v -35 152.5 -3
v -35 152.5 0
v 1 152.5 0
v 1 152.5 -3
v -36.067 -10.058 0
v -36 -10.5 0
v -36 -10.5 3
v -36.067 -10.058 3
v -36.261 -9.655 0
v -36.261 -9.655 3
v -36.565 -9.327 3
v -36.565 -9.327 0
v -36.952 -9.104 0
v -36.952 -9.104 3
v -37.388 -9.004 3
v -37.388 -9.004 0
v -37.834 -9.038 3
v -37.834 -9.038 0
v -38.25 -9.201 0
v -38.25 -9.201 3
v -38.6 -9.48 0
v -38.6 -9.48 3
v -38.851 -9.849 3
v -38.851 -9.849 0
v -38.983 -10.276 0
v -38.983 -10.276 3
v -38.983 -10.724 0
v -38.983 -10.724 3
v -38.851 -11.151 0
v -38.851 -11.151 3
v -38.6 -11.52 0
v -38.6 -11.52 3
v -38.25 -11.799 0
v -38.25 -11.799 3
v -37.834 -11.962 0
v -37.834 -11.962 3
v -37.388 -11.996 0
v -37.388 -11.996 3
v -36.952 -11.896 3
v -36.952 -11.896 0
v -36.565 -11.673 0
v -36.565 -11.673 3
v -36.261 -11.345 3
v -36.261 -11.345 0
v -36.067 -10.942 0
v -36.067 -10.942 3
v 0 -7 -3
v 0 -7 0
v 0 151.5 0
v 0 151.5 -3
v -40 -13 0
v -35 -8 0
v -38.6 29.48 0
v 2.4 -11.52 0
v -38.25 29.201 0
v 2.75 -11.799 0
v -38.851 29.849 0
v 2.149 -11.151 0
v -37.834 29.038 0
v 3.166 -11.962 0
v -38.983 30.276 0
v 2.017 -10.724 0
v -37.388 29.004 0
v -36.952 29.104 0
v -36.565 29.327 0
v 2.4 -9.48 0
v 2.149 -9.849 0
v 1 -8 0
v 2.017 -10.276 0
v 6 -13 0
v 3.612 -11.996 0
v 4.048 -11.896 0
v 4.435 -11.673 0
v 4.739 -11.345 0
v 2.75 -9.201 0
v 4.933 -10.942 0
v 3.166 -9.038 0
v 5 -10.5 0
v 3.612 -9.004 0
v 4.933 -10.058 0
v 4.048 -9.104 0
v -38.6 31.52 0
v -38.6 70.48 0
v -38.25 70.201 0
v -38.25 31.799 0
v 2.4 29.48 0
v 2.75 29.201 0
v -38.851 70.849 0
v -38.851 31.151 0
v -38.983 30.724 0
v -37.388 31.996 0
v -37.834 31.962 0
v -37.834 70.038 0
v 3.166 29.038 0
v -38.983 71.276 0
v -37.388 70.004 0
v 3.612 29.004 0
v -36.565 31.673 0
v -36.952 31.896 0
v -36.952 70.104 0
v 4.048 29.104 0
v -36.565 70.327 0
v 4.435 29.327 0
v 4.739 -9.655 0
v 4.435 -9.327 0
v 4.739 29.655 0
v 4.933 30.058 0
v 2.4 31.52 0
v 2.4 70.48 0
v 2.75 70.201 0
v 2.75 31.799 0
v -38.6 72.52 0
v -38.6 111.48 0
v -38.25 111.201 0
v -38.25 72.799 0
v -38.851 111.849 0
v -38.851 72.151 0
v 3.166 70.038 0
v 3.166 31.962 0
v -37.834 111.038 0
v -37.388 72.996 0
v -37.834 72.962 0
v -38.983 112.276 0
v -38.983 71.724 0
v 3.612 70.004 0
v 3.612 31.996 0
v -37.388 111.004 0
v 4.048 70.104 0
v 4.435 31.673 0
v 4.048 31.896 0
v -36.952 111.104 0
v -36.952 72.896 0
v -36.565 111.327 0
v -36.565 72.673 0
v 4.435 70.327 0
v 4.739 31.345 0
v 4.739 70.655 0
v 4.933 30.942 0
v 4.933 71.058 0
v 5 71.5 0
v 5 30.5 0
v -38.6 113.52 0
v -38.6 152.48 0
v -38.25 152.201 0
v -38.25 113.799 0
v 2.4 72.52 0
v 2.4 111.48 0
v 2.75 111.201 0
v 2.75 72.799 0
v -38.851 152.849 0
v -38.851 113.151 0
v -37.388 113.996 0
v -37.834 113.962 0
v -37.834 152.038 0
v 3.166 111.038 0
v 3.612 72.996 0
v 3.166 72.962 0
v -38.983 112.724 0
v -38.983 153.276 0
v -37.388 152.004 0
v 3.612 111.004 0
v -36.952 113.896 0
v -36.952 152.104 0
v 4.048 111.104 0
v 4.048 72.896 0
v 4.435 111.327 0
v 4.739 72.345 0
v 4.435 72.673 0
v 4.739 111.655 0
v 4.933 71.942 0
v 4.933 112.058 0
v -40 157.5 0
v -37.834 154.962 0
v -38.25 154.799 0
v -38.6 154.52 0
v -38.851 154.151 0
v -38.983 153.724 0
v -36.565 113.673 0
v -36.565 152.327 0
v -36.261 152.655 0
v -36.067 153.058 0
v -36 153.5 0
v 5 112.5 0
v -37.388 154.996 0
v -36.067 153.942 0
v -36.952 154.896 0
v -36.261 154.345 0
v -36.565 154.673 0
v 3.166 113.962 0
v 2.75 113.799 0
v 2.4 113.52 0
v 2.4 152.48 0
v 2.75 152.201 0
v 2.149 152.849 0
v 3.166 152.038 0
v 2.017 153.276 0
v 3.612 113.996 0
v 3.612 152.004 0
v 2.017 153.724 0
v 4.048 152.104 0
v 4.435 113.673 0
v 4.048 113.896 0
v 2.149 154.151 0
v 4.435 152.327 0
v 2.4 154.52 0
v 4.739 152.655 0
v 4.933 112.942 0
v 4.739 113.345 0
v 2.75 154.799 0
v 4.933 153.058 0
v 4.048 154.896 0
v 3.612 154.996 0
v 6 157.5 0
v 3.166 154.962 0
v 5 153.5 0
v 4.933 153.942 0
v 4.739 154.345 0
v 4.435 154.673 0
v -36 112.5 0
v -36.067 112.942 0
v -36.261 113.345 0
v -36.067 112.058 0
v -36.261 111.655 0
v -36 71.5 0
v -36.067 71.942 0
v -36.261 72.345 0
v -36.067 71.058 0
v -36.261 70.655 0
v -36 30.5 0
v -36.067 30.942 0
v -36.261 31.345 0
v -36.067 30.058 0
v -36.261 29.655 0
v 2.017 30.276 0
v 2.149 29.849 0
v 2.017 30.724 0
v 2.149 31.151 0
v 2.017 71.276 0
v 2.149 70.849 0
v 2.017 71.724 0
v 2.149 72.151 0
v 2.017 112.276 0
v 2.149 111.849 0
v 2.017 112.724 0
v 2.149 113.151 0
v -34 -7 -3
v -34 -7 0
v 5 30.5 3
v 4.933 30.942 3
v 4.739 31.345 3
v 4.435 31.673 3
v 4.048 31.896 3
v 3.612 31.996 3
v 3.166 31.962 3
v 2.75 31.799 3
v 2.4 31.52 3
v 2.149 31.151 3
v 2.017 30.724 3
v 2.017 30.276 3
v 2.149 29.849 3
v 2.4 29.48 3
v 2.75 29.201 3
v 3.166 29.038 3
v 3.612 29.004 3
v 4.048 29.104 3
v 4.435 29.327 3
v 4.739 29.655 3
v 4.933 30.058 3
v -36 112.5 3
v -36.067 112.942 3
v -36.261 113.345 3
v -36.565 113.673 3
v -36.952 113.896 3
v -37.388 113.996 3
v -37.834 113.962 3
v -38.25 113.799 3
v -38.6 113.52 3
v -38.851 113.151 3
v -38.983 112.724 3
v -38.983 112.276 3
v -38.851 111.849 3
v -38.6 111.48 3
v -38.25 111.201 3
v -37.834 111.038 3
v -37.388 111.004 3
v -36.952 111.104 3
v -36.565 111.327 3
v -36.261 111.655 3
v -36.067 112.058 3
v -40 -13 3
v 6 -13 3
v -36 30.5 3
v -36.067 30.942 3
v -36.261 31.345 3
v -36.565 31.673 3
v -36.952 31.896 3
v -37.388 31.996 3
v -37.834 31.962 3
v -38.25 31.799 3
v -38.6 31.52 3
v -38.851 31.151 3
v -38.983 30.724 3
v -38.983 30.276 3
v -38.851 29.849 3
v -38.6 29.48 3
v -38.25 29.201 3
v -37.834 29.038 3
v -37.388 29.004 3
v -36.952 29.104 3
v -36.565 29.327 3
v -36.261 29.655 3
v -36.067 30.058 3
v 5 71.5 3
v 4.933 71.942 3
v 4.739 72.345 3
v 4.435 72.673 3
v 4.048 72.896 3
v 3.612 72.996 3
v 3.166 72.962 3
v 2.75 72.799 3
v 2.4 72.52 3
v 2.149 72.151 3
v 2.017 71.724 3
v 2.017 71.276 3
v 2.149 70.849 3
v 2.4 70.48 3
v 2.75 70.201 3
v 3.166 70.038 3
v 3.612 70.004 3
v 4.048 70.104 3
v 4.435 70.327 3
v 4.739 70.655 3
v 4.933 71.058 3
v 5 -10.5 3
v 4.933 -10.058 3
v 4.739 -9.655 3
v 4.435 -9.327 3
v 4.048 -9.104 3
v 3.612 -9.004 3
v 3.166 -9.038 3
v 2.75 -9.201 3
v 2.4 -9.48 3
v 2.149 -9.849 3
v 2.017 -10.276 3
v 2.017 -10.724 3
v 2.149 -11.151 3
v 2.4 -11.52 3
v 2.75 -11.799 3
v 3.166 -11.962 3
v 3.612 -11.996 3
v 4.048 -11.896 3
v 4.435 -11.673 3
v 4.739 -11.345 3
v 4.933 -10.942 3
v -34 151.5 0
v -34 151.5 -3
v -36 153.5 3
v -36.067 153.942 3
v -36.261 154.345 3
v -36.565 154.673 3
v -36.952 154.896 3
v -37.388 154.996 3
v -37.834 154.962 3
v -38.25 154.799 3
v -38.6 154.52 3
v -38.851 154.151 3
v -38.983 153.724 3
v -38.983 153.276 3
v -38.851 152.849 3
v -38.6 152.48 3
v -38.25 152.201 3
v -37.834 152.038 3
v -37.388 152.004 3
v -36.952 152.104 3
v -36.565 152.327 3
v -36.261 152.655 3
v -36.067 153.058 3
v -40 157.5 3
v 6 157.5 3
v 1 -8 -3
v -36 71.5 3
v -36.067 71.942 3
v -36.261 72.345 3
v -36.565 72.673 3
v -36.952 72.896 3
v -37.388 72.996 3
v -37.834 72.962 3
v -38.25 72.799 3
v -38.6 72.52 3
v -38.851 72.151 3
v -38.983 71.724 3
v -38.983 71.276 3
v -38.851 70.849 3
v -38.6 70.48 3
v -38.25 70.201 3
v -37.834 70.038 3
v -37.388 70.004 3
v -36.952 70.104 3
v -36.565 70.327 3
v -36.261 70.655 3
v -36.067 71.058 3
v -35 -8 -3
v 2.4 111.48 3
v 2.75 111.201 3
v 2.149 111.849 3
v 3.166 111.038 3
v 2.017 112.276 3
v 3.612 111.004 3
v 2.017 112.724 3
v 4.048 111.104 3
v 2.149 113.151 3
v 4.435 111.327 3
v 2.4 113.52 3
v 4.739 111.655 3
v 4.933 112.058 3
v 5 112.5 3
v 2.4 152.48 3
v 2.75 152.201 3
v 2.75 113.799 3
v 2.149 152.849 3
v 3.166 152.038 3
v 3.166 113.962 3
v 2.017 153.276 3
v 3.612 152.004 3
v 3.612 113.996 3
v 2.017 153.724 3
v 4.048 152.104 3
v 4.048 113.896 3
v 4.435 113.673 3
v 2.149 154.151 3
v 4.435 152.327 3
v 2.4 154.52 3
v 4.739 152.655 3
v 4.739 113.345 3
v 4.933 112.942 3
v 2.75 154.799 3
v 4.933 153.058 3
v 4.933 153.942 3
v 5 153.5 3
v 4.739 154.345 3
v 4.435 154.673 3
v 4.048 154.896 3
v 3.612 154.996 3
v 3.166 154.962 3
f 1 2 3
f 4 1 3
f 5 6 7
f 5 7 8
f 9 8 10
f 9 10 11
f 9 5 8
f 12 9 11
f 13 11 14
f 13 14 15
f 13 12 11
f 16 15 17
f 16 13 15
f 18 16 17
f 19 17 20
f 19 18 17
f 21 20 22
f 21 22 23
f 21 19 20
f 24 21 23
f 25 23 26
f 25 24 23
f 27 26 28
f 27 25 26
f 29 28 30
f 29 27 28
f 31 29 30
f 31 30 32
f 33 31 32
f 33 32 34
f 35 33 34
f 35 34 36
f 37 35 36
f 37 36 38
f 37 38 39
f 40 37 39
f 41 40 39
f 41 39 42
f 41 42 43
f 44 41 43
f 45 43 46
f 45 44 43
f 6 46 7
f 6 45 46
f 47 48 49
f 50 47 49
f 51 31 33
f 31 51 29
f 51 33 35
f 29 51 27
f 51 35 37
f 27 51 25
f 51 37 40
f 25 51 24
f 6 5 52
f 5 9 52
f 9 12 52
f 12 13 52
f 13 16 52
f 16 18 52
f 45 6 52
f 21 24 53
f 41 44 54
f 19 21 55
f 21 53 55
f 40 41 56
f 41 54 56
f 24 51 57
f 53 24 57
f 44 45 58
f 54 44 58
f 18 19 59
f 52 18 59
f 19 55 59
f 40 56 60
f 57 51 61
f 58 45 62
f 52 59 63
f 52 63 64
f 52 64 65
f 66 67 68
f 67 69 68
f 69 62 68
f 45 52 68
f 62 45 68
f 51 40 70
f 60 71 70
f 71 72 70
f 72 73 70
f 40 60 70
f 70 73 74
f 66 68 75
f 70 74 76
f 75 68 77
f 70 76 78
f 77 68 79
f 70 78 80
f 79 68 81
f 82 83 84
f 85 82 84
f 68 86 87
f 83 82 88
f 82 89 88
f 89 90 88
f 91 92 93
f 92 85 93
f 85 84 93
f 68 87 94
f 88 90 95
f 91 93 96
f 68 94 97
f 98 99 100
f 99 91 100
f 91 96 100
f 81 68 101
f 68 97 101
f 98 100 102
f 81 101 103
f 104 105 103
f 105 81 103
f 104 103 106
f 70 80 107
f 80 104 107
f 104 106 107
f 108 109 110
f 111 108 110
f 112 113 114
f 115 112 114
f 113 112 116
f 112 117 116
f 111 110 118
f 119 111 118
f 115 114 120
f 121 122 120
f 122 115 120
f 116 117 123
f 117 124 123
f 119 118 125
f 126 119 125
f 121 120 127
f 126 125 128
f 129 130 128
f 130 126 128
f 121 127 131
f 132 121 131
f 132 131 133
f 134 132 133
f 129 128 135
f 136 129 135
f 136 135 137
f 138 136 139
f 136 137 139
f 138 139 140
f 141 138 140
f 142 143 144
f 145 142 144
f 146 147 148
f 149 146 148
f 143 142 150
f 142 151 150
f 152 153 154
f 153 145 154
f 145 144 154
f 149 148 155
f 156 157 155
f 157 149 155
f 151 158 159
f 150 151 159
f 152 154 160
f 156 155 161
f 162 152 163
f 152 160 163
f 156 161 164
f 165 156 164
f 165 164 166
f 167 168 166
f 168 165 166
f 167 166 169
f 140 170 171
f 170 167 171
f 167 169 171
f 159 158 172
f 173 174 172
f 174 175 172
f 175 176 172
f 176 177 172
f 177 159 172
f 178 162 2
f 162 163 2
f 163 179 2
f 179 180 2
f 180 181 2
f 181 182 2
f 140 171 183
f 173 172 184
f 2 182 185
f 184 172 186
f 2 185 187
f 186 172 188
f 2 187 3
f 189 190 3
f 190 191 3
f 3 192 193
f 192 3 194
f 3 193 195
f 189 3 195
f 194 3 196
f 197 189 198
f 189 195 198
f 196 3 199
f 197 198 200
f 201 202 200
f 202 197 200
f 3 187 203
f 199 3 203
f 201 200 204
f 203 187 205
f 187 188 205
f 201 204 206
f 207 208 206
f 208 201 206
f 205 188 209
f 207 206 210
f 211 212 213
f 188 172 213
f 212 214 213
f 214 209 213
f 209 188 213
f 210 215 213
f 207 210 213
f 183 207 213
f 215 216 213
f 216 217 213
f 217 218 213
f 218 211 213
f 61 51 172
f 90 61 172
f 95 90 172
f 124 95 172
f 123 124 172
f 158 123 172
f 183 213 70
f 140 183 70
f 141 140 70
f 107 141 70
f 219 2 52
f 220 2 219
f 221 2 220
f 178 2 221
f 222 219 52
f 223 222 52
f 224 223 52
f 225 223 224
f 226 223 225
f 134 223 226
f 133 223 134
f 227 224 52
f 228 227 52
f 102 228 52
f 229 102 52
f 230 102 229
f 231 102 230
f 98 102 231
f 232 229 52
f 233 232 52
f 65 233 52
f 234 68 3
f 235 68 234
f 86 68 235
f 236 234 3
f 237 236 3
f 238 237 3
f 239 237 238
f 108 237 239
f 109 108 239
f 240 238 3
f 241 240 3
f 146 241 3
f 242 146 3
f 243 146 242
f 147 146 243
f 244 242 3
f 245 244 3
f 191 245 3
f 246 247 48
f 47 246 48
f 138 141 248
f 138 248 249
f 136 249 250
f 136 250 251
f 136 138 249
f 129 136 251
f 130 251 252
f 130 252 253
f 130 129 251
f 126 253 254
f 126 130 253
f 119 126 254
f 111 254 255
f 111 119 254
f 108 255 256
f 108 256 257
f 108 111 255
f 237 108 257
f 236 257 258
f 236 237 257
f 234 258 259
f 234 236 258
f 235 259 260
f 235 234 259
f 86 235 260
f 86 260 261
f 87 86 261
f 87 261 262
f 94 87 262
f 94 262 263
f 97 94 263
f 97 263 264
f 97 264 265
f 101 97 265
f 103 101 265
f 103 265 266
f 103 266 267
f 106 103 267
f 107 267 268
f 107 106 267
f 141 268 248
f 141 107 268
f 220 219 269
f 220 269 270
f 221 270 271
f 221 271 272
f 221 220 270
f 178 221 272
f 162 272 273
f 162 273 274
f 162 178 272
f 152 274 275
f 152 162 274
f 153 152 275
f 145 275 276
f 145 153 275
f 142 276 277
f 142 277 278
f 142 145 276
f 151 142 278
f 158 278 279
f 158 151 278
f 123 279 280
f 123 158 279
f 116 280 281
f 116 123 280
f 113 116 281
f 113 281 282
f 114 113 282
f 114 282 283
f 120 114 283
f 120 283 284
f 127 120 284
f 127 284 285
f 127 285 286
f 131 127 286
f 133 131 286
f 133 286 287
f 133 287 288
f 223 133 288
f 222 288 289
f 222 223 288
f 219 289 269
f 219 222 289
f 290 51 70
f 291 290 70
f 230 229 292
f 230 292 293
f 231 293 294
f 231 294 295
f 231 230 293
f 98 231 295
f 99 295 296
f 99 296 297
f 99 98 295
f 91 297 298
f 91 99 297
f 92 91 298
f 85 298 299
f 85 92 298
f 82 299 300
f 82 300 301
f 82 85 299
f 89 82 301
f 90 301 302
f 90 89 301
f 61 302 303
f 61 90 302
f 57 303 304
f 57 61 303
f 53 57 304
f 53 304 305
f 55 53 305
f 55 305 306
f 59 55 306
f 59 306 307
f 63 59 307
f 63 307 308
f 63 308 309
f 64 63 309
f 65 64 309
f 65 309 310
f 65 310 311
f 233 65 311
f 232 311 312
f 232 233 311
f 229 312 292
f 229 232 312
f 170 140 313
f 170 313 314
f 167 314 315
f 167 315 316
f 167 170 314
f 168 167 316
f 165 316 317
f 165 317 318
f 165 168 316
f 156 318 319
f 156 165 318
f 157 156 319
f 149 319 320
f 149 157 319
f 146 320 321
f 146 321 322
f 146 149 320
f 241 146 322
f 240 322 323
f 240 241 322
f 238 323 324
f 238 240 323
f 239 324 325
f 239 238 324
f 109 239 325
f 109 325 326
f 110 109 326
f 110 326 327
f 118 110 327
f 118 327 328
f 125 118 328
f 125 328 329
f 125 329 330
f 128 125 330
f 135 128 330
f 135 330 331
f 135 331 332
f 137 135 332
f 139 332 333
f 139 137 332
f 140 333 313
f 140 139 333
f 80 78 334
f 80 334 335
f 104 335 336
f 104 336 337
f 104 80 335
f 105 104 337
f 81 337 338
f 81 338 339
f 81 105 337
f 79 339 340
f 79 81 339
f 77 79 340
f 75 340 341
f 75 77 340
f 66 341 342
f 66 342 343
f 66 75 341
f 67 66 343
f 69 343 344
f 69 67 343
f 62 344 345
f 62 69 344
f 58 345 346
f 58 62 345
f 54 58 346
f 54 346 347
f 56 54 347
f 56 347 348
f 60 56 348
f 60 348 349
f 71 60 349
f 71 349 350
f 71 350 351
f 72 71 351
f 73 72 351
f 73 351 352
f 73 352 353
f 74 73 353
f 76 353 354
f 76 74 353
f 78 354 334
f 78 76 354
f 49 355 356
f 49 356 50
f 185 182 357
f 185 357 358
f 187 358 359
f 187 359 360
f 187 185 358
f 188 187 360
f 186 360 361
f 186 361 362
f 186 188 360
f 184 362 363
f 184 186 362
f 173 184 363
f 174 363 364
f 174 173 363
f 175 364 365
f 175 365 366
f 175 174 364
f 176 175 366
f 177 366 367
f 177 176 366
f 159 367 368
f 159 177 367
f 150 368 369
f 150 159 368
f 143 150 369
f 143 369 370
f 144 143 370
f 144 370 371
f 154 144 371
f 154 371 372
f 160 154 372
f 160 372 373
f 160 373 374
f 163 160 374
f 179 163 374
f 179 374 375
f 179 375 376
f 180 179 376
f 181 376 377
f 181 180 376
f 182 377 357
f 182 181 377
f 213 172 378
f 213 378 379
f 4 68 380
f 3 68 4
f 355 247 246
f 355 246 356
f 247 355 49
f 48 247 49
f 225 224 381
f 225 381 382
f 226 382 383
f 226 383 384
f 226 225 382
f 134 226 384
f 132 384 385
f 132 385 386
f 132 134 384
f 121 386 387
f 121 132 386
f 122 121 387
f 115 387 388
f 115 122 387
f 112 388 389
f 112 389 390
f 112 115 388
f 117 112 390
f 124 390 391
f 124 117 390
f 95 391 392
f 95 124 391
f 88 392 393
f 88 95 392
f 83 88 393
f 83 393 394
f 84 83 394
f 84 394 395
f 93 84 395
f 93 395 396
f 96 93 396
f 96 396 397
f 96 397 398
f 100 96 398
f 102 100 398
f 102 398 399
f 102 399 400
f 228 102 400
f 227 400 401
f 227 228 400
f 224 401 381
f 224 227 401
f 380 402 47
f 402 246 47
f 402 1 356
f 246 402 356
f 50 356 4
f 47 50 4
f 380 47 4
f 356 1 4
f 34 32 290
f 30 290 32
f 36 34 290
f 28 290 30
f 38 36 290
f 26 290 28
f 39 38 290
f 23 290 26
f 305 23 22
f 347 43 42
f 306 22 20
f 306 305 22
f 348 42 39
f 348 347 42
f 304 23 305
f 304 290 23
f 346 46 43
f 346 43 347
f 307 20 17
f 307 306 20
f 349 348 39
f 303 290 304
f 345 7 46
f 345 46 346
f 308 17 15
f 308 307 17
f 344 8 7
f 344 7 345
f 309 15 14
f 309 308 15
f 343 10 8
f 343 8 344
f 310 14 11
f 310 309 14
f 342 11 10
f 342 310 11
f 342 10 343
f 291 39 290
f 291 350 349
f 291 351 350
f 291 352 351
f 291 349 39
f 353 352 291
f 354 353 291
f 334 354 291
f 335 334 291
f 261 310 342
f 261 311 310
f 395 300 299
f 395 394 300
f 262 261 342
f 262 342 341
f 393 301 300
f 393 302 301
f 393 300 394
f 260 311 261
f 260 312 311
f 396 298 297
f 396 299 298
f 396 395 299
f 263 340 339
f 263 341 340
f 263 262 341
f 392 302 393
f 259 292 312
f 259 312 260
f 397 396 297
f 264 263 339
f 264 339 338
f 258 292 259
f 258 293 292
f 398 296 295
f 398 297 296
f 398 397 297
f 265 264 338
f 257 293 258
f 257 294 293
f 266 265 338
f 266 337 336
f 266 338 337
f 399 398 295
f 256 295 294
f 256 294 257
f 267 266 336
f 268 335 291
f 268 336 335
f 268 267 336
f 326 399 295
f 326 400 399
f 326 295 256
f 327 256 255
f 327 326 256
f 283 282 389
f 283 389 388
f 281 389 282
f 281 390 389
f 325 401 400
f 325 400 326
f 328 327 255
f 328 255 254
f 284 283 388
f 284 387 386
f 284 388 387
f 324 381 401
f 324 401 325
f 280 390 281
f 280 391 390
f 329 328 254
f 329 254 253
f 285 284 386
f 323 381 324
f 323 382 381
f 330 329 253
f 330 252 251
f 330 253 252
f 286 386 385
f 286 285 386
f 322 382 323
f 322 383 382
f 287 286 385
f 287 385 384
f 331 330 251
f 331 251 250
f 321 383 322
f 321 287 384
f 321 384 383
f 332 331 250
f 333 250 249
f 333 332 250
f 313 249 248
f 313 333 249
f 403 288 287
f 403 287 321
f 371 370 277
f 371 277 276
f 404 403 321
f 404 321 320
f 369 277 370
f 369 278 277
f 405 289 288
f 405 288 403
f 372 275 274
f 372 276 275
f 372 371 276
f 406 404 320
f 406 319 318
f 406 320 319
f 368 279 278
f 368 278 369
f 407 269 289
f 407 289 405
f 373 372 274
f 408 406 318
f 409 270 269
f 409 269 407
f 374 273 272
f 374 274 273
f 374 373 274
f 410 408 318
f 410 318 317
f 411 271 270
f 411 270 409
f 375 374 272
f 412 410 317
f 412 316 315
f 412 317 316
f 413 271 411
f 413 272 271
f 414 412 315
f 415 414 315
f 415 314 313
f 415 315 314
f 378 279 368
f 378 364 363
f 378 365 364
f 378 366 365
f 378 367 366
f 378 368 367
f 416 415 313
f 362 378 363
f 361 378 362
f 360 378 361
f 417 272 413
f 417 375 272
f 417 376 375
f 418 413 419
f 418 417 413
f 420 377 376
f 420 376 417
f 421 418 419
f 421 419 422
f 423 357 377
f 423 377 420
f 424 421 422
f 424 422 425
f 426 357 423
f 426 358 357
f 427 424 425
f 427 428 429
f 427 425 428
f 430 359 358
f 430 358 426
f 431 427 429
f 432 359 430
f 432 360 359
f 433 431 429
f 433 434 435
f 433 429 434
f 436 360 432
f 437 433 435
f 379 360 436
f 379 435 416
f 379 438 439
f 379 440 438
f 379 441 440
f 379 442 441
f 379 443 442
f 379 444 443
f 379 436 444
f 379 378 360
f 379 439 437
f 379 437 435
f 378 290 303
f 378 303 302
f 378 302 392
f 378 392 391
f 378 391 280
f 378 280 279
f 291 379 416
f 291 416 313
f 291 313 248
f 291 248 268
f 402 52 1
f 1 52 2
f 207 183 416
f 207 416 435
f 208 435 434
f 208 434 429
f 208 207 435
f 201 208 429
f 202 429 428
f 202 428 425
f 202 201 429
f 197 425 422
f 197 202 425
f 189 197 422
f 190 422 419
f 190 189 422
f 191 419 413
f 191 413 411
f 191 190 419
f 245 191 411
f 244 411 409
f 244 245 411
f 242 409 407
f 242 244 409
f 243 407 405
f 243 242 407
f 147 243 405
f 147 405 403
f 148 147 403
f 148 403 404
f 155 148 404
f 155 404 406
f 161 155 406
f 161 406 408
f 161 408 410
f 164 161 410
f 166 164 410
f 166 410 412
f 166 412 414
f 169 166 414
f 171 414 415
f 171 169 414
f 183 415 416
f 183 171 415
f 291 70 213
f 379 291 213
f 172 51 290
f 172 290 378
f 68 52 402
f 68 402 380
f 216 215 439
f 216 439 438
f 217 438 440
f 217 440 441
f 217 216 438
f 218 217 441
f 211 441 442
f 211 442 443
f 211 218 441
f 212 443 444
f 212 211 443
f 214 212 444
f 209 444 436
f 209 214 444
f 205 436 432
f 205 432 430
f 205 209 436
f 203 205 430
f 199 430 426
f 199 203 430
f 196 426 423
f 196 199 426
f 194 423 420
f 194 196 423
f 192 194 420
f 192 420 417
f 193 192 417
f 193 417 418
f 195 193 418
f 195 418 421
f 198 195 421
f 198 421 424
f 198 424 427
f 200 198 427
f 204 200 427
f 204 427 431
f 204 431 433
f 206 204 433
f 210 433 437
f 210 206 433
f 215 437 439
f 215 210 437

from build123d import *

# Parameters (mm, degrees)
SKICA1_W                = 46
SKICA1_H                = 170.5
SKICA1_R                = 1.5
P_IDAT_VYSUNUT_M1_DEPTH = 3
SKICA2_W                = 36
SKICA2_H                = 160.5
SKICA2_W_2              = 34
SKICA2_H_2              = 158.5
P_IDAT_VYSUNUT_M2_DEPTH = 6


with BuildPart() as part:
    # Skica1 → Přidat vysunutím1 (new body)
    with BuildSketch(Plane.XY):
        with Locations((-17, 72.25)):
            Rectangle(SKICA1_W, SKICA1_H)
        with Locations((-37.5, -10.5)):
            Circle(SKICA1_R, mode=Mode.SUBTRACT)
        with Locations((3.5, -10.5)):
            Circle(SKICA1_R, mode=Mode.SUBTRACT)
        with Locations((3.5, 30.5)):
            Circle(SKICA1_R, mode=Mode.SUBTRACT)
        with Locations((3.5, 71.5)):
            Circle(SKICA1_R, mode=Mode.SUBTRACT)
        with Locations((3.5, 112.5)):
            Circle(SKICA1_R, mode=Mode.SUBTRACT)
        with Locations((3.5, 153.5)):
            Circle(SKICA1_R, mode=Mode.SUBTRACT)
        with Locations((-37.5, 30.5)):
            Circle(SKICA1_R, mode=Mode.SUBTRACT)
        with Locations((-37.5, 71.5)):
            Circle(SKICA1_R, mode=Mode.SUBTRACT)
        with Locations((-37.5, 112.5)):
            Circle(SKICA1_R, mode=Mode.SUBTRACT)
        with Locations((-37.5, 153.5)):
            Circle(SKICA1_R, mode=Mode.SUBTRACT)
    extrude(amount=P_IDAT_VYSUNUT_M1_DEPTH)

    # Skica2 → Přidat vysunutím2 (add)
    with BuildSketch(Plane.XY.offset(3)):
        with Locations((-17, 72.25)):
            Rectangle(SKICA2_W, SKICA2_H)
        with Locations((-17, 72.25)):
            Rectangle(SKICA2_W_2, SKICA2_H_2, mode=Mode.SUBTRACT)
    extrude(amount=-P_IDAT_VYSUNUT_M2_DEPTH)


solid = part.part
